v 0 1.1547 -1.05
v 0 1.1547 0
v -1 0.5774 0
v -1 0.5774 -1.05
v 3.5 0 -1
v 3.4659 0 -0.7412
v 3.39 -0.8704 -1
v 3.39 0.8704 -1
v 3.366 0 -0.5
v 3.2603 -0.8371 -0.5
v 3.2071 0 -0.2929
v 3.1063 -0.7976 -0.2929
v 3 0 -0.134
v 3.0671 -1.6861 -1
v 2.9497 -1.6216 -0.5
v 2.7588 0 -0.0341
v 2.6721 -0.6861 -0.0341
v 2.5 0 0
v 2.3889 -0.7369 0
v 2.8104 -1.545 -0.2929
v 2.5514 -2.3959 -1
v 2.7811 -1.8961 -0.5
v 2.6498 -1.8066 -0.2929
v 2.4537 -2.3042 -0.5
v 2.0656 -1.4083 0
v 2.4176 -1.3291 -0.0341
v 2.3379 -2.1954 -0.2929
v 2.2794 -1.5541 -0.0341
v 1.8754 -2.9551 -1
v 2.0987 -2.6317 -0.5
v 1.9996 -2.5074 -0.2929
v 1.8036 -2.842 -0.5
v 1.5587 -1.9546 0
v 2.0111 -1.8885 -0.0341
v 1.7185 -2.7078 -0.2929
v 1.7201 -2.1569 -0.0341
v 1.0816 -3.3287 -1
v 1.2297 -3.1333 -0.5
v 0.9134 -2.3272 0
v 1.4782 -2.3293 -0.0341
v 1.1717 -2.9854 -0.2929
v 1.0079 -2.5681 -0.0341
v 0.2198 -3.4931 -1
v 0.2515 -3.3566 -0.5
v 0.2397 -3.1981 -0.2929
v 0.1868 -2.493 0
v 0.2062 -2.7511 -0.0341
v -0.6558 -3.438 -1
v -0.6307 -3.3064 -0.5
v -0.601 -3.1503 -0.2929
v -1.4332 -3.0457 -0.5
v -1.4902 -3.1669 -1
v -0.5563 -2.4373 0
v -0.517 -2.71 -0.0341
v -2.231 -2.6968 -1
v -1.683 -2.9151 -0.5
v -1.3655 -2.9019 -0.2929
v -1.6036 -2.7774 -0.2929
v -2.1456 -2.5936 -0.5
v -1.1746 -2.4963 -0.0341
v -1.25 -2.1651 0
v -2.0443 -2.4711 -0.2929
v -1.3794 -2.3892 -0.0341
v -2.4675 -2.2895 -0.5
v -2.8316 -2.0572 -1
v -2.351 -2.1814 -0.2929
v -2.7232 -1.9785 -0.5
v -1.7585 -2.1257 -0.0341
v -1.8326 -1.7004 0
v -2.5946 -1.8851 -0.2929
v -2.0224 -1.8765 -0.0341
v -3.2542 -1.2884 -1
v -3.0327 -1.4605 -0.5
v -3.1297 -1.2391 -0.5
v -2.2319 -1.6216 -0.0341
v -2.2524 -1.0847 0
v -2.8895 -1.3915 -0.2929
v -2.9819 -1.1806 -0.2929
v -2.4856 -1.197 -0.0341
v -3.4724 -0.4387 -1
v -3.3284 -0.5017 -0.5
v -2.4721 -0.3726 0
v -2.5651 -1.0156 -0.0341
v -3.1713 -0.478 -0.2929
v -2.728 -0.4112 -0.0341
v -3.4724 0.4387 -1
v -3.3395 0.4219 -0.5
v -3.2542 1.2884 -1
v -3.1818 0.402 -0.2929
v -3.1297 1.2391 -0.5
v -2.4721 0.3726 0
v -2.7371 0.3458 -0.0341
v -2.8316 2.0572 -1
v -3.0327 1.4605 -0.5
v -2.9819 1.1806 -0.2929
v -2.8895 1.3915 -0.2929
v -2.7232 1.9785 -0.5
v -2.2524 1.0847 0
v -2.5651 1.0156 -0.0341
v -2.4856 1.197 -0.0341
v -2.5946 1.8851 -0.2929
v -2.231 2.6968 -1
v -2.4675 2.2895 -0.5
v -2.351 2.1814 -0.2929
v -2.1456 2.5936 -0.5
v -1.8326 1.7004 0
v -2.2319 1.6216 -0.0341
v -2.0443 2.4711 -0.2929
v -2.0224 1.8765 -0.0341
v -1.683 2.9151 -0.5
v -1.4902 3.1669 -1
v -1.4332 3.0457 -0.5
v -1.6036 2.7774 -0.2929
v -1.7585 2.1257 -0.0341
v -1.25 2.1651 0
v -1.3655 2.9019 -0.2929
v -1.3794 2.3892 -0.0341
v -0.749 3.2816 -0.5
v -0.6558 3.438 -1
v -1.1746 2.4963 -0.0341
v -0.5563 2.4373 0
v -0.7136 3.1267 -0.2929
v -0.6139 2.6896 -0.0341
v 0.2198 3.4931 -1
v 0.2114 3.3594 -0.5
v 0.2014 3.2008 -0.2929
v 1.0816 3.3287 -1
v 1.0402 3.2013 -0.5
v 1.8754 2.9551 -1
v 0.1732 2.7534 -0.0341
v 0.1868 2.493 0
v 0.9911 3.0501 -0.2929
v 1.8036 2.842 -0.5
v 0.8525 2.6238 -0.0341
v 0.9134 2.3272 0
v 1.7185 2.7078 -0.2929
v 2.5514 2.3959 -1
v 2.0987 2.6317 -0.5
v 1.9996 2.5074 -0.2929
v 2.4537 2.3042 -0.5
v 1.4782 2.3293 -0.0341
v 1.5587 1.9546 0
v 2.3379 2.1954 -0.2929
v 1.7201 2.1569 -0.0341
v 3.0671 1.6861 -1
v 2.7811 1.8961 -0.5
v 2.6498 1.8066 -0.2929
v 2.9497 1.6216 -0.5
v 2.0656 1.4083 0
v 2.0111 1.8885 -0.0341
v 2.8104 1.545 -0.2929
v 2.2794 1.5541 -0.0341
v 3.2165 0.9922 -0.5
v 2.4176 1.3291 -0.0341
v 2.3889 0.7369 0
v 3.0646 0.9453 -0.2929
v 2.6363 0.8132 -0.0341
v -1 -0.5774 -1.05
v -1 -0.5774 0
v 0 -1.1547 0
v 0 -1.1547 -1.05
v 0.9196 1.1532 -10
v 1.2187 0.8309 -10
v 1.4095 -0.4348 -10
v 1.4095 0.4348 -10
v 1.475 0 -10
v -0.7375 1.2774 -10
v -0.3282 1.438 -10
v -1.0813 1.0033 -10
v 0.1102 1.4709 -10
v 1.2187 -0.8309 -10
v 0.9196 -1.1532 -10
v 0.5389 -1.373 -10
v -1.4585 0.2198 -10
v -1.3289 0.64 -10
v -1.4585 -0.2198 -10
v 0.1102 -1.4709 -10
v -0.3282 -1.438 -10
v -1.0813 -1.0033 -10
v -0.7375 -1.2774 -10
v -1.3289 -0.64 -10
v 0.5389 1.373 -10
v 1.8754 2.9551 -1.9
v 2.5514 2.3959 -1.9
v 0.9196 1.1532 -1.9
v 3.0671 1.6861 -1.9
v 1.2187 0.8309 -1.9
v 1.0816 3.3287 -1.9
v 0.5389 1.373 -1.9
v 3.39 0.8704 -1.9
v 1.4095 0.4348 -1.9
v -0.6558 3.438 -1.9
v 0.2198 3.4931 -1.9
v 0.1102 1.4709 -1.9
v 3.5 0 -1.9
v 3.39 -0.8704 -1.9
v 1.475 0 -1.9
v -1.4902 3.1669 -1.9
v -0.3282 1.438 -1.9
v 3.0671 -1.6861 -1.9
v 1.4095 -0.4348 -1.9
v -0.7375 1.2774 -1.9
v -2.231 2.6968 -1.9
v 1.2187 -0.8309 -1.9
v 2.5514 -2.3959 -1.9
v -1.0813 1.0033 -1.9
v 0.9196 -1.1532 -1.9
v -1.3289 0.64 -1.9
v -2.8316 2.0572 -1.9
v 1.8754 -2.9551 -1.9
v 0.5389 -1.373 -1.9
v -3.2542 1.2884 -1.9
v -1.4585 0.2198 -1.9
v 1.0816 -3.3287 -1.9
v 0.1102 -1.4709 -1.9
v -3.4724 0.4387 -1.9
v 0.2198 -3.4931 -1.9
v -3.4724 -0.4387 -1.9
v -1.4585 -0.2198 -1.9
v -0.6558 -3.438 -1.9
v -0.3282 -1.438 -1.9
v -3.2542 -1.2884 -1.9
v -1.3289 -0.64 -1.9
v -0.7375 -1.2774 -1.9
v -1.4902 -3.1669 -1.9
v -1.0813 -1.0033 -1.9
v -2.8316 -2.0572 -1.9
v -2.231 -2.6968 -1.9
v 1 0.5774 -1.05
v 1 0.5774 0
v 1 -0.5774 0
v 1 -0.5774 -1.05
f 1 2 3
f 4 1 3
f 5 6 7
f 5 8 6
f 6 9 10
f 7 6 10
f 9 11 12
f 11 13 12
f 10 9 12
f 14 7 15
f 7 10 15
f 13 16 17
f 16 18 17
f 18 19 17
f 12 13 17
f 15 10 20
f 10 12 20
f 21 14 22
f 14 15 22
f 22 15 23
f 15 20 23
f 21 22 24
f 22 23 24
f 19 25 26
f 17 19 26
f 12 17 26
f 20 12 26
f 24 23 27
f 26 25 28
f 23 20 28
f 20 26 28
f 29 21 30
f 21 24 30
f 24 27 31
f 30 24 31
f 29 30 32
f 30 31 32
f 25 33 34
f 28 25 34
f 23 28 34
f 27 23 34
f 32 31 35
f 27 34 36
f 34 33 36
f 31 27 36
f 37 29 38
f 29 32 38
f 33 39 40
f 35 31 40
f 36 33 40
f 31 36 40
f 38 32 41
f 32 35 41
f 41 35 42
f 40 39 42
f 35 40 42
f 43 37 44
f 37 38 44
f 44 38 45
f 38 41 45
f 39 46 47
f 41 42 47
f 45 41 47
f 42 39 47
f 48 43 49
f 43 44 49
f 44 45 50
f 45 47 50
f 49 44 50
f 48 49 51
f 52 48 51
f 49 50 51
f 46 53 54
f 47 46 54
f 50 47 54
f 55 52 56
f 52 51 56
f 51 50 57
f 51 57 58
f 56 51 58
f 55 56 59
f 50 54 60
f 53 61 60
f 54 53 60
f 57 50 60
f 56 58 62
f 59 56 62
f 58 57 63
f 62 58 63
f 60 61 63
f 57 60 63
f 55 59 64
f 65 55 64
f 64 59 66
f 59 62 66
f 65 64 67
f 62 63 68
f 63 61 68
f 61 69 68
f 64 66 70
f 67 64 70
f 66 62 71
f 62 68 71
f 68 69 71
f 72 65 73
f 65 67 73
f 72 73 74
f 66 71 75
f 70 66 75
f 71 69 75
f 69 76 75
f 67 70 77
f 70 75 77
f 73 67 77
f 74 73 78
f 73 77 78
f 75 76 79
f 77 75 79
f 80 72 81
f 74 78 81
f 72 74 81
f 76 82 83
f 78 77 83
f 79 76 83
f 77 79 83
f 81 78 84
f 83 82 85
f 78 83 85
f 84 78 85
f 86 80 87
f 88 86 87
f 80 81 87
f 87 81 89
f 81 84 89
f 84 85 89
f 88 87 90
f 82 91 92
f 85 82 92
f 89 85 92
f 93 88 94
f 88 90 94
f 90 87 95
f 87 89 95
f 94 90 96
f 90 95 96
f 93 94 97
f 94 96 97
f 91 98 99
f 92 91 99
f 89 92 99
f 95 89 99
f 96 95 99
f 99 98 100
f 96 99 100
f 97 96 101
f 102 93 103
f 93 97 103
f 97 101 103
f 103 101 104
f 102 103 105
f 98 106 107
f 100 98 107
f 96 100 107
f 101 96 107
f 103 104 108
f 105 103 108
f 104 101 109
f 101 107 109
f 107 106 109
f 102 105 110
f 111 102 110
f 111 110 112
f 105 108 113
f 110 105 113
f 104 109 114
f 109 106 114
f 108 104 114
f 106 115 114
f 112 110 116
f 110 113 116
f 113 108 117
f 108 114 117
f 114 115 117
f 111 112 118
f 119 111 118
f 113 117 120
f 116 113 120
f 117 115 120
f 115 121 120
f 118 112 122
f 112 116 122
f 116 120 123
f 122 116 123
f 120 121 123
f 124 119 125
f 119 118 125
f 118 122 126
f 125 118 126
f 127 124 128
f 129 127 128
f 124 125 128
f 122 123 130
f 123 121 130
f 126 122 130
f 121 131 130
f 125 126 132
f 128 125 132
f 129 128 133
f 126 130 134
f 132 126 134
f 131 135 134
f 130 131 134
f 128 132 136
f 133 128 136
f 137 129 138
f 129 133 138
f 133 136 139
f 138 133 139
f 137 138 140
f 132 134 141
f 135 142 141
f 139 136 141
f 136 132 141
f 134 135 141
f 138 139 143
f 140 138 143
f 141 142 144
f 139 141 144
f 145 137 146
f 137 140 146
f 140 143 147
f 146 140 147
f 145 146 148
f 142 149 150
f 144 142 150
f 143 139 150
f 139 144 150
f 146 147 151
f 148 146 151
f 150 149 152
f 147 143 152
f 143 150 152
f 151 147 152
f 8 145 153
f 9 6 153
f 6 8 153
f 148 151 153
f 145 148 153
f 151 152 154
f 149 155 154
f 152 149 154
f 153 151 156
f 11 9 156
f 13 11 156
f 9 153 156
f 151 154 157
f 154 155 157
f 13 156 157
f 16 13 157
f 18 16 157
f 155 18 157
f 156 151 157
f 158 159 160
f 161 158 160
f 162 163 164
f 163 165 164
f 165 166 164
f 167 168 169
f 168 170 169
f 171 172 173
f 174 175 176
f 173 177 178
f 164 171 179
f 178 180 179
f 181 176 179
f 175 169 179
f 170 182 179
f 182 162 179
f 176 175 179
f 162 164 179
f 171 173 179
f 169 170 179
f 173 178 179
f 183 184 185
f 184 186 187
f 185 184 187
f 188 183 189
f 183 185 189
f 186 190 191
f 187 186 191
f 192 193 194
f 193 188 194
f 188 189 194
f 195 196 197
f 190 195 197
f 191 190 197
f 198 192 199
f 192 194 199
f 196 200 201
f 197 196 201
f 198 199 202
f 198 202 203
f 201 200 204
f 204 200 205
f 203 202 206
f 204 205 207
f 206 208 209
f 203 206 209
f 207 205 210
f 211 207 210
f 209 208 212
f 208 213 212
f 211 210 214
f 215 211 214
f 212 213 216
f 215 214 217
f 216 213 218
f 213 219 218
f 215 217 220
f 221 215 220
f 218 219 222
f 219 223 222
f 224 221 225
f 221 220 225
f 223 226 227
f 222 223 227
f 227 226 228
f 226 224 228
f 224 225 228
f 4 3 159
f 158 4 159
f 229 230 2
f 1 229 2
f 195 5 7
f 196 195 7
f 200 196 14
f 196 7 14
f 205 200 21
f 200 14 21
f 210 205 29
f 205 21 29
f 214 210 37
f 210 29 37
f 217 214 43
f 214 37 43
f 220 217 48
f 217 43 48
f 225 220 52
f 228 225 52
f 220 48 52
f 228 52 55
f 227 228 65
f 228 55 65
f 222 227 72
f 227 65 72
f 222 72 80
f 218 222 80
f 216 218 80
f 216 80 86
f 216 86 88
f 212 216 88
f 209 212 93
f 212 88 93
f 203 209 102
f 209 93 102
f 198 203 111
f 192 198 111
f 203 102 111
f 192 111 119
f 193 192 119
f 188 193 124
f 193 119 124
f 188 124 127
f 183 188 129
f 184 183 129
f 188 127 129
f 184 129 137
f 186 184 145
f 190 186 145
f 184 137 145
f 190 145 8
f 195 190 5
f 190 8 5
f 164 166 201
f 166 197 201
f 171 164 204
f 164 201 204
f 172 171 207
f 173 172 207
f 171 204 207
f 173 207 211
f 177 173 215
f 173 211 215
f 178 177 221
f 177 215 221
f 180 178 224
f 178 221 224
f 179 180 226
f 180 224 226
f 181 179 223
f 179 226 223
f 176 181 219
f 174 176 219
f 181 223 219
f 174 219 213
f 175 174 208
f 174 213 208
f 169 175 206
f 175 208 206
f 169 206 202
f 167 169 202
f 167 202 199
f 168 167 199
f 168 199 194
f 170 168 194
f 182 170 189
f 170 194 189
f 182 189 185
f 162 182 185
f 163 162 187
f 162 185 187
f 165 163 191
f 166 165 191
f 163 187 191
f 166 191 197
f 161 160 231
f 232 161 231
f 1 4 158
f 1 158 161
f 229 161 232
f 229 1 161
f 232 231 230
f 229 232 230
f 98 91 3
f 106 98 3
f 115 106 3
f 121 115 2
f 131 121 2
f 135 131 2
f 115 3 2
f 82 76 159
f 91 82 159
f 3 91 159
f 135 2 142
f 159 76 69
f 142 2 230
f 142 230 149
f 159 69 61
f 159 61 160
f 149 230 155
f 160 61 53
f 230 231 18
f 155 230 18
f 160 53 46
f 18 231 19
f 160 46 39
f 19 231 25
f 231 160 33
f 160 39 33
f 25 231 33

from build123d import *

# Parameters (mm, degrees)
FILLET1_R          = 1
CUT_EXTRUDE1_DEPTH = 1.05


with BuildPart() as part:
    # Sketch1 → Revolve1 (revolve)
    with BuildSketch(Plane(origin=(0, 0, 0), x_dir=(0, 0, -1), z_dir=(1, 0, 0)), mode=Mode.PRIVATE) as revolve1_sk:
        Polygon((1.9, 1.475), (1.9, 3.5), (0, 3.5), (0, 0), (10, 0), (10, 1.475), align=None)
    revolve(revolve1_sk.sketch.rotate(Axis((0, 0, 0), (0, 0, -1)), 90), axis=Axis((0, 0, 0), (0, 0, -1)))

    # Fillet1
    fillet1_edges = [part.edges().sort_by_distance(p)[0] for p in [
        (-3.5, 0, 0),
    ]]
    fillet(fillet1_edges, radius=FILLET1_R)

    # Sketch2 → Cut-Extrude1 (cut)
    with BuildSketch(Plane.XY):
        Polygon((0, 1.154700538), (-1, 0.577350269), (-1, -0.577350269), (0, -1.154700538), (1, -0.577350269), (1, 0.577350269), align=None)
    extrude(amount=-CUT_EXTRUDE1_DEPTH, mode=Mode.SUBTRACT)


solid = part.part
